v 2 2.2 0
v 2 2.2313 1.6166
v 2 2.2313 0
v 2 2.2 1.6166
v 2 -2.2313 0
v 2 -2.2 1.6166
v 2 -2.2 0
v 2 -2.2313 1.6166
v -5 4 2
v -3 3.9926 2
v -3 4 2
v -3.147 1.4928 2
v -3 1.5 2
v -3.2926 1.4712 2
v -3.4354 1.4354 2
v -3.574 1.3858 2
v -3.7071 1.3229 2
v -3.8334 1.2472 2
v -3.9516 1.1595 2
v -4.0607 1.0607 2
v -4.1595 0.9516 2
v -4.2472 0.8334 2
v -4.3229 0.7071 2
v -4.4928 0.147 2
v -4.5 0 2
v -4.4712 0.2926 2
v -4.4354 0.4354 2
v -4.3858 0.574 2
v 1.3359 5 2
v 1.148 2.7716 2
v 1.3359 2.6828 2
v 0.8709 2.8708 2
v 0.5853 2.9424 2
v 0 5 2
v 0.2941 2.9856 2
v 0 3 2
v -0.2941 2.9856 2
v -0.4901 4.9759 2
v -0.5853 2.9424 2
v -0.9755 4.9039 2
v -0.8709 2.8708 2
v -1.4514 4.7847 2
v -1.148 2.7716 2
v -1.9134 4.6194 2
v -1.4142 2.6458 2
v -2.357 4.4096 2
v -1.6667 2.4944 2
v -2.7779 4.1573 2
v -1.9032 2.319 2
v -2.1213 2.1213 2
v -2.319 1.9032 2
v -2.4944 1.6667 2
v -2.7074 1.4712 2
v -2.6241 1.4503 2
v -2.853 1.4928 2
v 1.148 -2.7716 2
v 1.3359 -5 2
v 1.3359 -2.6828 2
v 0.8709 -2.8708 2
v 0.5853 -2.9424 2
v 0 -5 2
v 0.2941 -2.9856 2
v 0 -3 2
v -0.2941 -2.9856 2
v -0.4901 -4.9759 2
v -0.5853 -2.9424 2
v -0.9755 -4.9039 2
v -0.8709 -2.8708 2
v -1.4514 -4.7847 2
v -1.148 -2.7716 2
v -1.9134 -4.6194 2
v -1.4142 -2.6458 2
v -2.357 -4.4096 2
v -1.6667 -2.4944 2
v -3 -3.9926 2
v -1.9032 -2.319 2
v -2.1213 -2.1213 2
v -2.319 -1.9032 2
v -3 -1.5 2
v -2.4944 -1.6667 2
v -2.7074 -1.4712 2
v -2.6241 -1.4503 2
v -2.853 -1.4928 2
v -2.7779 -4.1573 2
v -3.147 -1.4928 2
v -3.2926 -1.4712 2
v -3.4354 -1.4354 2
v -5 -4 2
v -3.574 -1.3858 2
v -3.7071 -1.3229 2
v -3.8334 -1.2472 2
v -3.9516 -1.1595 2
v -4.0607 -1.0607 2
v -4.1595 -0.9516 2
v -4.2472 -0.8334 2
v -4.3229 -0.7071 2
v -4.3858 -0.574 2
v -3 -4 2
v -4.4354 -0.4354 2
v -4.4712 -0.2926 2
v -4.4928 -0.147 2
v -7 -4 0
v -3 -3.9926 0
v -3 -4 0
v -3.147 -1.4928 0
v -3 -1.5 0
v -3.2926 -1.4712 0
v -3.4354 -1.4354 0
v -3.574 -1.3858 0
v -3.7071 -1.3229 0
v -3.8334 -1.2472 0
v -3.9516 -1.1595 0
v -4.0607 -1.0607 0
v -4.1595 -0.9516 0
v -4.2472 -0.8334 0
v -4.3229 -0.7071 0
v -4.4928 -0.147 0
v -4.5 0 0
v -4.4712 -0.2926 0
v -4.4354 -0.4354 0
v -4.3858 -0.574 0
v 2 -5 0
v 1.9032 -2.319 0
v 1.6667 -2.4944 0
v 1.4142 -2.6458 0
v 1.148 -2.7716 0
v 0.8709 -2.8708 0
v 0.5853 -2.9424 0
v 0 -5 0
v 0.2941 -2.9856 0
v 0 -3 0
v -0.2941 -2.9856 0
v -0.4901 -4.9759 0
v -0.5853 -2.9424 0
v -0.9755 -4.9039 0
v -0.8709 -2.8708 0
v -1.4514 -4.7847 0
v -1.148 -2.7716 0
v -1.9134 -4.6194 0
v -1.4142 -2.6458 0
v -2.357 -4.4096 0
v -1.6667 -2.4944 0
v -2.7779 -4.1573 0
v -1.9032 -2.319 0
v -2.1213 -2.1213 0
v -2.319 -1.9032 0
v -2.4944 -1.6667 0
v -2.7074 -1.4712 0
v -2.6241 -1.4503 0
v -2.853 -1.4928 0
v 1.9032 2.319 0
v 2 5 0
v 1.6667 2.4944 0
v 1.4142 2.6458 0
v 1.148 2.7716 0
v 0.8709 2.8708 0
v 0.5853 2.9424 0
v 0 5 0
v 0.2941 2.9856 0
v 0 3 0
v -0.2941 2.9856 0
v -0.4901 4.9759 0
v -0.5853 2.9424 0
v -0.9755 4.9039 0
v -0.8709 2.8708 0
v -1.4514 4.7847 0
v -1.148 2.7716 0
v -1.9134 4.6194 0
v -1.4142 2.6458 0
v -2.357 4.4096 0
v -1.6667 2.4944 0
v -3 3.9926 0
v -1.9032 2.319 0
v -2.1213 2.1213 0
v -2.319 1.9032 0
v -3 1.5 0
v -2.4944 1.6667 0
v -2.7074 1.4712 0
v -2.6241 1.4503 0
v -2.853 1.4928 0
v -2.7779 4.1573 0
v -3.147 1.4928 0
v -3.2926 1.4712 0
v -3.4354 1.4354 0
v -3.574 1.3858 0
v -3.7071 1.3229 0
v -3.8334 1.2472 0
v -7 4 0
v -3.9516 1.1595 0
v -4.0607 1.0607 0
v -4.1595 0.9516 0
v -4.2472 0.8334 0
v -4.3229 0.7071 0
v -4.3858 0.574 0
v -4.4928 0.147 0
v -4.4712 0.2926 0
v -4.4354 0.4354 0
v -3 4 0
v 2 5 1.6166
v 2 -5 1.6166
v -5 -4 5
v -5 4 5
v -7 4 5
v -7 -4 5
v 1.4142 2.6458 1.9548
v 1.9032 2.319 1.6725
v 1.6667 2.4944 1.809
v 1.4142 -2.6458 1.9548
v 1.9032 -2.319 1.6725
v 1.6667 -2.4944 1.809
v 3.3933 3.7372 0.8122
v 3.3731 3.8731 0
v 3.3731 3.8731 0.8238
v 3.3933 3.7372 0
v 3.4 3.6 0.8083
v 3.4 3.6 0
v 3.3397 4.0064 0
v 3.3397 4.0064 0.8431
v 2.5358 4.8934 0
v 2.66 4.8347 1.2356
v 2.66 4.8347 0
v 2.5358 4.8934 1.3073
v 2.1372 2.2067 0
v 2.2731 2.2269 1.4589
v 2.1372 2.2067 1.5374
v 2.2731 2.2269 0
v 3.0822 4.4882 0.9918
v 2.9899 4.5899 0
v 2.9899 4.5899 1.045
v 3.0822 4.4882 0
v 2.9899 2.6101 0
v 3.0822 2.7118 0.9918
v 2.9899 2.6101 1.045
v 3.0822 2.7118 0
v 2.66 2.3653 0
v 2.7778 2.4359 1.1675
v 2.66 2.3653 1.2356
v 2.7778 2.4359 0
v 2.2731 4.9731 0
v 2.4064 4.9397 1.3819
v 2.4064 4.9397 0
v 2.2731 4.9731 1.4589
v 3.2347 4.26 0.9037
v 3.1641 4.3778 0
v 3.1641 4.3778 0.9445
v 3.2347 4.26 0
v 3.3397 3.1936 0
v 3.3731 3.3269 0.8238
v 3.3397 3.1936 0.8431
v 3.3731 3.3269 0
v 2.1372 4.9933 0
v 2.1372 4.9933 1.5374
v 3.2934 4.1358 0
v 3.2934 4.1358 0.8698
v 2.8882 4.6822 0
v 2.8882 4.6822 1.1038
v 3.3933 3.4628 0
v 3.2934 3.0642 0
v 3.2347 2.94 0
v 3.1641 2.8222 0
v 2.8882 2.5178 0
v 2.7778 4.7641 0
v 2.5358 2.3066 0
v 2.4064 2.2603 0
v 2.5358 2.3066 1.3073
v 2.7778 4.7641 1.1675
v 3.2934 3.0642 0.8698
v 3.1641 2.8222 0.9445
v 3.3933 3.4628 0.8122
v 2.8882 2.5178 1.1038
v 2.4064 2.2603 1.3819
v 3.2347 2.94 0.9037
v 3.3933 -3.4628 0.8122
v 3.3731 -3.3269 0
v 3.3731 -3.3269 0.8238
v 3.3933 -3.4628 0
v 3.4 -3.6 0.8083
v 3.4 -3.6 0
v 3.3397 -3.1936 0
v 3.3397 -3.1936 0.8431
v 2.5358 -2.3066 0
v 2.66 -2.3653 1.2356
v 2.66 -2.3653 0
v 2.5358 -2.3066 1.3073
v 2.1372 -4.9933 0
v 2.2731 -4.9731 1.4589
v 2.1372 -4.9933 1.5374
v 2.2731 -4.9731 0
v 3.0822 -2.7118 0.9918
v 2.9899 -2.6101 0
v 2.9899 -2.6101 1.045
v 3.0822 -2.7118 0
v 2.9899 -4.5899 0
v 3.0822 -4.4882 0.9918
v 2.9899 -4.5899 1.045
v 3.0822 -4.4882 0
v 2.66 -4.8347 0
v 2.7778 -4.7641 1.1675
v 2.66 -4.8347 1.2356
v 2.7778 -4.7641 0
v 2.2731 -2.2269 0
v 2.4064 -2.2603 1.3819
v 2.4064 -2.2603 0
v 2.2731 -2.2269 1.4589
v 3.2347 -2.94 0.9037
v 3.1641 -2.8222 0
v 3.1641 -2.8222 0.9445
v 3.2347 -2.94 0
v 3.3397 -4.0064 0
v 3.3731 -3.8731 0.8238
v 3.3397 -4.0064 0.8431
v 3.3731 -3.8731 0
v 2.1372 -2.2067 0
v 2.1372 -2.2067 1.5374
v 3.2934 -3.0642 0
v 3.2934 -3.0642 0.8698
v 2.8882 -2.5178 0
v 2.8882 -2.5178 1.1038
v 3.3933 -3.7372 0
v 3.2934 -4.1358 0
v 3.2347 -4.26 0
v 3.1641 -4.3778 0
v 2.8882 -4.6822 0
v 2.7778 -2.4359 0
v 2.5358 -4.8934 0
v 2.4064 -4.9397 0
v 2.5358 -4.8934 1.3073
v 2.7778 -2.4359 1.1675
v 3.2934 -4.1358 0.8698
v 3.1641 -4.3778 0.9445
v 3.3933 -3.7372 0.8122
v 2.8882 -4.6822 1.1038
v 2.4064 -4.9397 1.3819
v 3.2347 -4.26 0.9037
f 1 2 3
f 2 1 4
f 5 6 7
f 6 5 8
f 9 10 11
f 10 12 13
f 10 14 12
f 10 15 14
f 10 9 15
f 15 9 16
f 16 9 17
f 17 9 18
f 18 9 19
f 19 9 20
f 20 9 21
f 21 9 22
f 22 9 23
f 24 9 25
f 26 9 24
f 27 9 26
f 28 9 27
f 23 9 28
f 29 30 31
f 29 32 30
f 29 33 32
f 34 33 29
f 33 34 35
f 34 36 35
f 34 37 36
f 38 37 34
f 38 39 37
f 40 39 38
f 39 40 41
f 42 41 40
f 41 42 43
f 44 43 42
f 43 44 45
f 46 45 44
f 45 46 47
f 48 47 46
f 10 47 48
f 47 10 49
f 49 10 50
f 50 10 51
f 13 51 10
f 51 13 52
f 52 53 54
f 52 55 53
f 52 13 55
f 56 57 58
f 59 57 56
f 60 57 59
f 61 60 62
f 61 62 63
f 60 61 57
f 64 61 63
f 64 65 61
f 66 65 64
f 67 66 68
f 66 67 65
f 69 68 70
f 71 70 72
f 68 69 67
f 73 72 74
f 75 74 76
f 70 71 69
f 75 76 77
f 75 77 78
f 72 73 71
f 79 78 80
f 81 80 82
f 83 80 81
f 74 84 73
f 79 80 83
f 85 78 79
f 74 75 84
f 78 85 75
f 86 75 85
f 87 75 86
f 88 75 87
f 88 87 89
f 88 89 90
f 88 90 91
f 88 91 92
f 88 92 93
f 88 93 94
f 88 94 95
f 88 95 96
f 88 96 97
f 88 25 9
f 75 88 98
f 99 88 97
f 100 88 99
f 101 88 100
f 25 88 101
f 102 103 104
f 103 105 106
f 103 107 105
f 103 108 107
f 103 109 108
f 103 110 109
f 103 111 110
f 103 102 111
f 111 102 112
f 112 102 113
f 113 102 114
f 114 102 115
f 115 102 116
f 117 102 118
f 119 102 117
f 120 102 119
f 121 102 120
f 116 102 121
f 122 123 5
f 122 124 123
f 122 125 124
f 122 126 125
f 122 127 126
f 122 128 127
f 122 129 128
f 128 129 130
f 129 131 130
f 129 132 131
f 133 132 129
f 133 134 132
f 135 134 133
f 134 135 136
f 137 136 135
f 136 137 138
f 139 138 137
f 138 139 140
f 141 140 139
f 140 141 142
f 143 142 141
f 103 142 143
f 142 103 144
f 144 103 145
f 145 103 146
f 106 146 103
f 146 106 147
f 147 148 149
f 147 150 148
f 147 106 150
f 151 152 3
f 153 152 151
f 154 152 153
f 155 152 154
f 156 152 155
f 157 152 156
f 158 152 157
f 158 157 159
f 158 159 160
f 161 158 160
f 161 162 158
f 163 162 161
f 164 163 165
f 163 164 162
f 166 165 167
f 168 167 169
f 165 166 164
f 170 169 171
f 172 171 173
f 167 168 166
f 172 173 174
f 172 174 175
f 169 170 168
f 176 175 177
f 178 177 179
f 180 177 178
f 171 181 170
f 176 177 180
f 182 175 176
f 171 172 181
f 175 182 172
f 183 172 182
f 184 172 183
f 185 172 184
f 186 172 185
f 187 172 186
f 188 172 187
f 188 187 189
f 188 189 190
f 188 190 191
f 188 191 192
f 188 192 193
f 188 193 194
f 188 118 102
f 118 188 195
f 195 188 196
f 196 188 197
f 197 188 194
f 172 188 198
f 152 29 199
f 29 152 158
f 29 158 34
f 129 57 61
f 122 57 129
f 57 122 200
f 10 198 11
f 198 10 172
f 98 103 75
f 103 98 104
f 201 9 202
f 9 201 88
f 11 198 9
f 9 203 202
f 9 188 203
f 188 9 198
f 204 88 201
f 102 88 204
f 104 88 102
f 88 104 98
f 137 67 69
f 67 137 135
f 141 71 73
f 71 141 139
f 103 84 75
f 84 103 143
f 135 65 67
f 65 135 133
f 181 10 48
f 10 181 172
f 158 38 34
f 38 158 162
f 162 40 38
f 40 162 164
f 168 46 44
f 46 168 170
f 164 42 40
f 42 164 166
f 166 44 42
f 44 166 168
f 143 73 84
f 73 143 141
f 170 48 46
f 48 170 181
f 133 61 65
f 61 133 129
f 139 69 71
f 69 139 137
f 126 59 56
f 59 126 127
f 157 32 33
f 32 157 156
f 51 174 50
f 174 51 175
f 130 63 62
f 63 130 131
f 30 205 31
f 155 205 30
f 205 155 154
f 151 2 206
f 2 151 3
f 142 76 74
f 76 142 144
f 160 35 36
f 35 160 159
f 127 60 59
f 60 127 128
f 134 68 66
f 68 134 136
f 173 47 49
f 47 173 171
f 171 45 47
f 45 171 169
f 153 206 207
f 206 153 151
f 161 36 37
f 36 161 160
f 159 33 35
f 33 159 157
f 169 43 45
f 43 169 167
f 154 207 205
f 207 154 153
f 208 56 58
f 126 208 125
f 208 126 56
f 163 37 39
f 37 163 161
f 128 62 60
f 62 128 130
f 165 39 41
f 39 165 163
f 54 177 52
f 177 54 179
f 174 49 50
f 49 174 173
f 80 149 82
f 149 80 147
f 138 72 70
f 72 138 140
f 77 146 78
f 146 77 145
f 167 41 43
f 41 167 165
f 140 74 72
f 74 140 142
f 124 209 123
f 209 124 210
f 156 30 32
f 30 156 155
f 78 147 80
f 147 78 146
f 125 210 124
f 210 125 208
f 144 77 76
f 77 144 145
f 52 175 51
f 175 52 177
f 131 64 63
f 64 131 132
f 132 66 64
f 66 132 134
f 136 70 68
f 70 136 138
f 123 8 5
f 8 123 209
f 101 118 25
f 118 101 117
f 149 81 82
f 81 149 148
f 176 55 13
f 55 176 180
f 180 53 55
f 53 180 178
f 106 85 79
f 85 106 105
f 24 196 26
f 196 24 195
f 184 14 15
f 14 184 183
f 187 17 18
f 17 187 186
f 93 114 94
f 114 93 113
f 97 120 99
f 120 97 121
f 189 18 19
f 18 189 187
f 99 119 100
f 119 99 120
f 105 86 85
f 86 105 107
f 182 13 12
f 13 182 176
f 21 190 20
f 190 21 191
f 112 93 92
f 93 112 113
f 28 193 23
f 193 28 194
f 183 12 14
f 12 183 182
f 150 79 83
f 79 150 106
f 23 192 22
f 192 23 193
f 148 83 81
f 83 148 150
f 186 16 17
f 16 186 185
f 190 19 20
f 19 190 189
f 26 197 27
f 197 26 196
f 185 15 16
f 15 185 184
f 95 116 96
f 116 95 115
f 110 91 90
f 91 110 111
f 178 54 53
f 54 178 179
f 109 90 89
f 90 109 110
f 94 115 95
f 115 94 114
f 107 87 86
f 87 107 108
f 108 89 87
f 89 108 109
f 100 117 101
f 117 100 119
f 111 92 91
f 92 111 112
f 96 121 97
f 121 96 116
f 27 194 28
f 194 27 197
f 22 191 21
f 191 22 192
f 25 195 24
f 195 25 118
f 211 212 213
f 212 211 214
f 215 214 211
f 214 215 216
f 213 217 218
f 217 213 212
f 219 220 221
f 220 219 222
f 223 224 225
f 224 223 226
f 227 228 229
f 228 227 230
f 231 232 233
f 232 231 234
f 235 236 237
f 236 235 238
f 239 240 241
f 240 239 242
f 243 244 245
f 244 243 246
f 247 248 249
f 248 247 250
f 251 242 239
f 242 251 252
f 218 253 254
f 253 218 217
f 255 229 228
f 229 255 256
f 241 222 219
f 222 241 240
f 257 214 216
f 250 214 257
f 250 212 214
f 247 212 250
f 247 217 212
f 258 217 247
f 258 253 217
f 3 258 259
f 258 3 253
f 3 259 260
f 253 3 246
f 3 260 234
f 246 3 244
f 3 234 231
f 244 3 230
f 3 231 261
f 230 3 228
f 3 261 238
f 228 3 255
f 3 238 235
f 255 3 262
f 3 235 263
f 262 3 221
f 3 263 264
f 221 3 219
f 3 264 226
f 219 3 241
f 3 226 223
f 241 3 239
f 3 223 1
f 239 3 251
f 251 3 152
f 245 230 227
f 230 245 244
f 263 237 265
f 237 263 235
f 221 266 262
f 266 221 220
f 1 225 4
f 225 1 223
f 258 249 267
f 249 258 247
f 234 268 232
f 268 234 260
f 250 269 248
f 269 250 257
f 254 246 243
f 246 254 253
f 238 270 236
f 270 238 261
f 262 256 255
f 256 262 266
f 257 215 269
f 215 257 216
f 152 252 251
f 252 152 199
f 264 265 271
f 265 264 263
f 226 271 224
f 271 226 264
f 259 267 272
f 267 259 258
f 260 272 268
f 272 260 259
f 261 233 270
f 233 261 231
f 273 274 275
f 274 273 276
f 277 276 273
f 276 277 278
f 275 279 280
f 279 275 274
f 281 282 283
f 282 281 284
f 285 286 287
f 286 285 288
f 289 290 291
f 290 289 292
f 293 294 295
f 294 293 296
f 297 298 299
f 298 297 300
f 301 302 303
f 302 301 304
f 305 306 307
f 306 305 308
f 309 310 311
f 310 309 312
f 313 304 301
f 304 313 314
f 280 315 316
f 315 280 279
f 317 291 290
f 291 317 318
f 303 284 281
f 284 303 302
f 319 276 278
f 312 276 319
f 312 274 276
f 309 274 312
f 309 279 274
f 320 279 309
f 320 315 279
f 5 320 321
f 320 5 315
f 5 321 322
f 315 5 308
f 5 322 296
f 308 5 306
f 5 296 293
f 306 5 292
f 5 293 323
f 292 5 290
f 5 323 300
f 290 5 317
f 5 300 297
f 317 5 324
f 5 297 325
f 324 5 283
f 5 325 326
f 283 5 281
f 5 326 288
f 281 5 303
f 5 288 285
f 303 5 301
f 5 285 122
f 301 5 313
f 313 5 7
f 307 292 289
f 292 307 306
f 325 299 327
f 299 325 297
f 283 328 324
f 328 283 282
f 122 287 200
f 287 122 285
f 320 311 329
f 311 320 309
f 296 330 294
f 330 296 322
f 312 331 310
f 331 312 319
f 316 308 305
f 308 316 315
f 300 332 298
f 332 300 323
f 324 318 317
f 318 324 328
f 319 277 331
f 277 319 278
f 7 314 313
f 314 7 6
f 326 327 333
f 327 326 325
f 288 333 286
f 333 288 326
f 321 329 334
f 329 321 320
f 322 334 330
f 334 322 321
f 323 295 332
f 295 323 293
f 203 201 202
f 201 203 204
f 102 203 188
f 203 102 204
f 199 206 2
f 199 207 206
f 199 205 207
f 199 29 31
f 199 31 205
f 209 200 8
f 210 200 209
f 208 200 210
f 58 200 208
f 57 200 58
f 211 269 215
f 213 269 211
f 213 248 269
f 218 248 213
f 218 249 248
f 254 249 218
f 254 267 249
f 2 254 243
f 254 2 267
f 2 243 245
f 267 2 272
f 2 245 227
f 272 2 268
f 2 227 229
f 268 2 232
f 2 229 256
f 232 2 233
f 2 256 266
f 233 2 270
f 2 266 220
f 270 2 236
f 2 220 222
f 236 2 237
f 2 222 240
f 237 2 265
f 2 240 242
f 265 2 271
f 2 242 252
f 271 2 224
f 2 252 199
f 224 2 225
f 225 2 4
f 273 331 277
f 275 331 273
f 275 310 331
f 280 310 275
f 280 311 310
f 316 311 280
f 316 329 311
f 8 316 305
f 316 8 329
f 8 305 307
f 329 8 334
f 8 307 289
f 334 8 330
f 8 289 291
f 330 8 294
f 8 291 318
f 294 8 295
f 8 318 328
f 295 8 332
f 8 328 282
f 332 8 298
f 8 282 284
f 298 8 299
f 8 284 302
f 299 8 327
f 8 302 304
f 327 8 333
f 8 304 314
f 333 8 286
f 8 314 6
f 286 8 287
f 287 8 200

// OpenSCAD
$fn=64;

difference() {
  union() {
difference() {
  union() {
    translate([0,-5,0]) cube([2,10,2]);
    translate([-5,-4,0]) cube([2,8,2]);
    cylinder(r=5,h=2);
  }
  translate([0,0,-1]) {
    cylinder(r=3,h=10);
    translate([-3,0,0]) cylinder(r=1.5,h=10);
    translate([2,-5.5,0]) cube([5,11,10]);
  }
}
translate([2,3.6,0]) difference() {
  cylinder(r=1.4,h=2);
  translate([-10,-5,-1]) cube([10,10,10]);
}

translate([2,-3.6,0]) difference() {
  cylinder(r=1.4,h=2);
  translate([-10,-5,-1]) cube([10,10,10]);
}

translate([-7,-4,0]) cube([2,8,5]);
}
  rotate([0,30,0]) translate([-2,-10,2.4]) cube([20,20,20]);
}
